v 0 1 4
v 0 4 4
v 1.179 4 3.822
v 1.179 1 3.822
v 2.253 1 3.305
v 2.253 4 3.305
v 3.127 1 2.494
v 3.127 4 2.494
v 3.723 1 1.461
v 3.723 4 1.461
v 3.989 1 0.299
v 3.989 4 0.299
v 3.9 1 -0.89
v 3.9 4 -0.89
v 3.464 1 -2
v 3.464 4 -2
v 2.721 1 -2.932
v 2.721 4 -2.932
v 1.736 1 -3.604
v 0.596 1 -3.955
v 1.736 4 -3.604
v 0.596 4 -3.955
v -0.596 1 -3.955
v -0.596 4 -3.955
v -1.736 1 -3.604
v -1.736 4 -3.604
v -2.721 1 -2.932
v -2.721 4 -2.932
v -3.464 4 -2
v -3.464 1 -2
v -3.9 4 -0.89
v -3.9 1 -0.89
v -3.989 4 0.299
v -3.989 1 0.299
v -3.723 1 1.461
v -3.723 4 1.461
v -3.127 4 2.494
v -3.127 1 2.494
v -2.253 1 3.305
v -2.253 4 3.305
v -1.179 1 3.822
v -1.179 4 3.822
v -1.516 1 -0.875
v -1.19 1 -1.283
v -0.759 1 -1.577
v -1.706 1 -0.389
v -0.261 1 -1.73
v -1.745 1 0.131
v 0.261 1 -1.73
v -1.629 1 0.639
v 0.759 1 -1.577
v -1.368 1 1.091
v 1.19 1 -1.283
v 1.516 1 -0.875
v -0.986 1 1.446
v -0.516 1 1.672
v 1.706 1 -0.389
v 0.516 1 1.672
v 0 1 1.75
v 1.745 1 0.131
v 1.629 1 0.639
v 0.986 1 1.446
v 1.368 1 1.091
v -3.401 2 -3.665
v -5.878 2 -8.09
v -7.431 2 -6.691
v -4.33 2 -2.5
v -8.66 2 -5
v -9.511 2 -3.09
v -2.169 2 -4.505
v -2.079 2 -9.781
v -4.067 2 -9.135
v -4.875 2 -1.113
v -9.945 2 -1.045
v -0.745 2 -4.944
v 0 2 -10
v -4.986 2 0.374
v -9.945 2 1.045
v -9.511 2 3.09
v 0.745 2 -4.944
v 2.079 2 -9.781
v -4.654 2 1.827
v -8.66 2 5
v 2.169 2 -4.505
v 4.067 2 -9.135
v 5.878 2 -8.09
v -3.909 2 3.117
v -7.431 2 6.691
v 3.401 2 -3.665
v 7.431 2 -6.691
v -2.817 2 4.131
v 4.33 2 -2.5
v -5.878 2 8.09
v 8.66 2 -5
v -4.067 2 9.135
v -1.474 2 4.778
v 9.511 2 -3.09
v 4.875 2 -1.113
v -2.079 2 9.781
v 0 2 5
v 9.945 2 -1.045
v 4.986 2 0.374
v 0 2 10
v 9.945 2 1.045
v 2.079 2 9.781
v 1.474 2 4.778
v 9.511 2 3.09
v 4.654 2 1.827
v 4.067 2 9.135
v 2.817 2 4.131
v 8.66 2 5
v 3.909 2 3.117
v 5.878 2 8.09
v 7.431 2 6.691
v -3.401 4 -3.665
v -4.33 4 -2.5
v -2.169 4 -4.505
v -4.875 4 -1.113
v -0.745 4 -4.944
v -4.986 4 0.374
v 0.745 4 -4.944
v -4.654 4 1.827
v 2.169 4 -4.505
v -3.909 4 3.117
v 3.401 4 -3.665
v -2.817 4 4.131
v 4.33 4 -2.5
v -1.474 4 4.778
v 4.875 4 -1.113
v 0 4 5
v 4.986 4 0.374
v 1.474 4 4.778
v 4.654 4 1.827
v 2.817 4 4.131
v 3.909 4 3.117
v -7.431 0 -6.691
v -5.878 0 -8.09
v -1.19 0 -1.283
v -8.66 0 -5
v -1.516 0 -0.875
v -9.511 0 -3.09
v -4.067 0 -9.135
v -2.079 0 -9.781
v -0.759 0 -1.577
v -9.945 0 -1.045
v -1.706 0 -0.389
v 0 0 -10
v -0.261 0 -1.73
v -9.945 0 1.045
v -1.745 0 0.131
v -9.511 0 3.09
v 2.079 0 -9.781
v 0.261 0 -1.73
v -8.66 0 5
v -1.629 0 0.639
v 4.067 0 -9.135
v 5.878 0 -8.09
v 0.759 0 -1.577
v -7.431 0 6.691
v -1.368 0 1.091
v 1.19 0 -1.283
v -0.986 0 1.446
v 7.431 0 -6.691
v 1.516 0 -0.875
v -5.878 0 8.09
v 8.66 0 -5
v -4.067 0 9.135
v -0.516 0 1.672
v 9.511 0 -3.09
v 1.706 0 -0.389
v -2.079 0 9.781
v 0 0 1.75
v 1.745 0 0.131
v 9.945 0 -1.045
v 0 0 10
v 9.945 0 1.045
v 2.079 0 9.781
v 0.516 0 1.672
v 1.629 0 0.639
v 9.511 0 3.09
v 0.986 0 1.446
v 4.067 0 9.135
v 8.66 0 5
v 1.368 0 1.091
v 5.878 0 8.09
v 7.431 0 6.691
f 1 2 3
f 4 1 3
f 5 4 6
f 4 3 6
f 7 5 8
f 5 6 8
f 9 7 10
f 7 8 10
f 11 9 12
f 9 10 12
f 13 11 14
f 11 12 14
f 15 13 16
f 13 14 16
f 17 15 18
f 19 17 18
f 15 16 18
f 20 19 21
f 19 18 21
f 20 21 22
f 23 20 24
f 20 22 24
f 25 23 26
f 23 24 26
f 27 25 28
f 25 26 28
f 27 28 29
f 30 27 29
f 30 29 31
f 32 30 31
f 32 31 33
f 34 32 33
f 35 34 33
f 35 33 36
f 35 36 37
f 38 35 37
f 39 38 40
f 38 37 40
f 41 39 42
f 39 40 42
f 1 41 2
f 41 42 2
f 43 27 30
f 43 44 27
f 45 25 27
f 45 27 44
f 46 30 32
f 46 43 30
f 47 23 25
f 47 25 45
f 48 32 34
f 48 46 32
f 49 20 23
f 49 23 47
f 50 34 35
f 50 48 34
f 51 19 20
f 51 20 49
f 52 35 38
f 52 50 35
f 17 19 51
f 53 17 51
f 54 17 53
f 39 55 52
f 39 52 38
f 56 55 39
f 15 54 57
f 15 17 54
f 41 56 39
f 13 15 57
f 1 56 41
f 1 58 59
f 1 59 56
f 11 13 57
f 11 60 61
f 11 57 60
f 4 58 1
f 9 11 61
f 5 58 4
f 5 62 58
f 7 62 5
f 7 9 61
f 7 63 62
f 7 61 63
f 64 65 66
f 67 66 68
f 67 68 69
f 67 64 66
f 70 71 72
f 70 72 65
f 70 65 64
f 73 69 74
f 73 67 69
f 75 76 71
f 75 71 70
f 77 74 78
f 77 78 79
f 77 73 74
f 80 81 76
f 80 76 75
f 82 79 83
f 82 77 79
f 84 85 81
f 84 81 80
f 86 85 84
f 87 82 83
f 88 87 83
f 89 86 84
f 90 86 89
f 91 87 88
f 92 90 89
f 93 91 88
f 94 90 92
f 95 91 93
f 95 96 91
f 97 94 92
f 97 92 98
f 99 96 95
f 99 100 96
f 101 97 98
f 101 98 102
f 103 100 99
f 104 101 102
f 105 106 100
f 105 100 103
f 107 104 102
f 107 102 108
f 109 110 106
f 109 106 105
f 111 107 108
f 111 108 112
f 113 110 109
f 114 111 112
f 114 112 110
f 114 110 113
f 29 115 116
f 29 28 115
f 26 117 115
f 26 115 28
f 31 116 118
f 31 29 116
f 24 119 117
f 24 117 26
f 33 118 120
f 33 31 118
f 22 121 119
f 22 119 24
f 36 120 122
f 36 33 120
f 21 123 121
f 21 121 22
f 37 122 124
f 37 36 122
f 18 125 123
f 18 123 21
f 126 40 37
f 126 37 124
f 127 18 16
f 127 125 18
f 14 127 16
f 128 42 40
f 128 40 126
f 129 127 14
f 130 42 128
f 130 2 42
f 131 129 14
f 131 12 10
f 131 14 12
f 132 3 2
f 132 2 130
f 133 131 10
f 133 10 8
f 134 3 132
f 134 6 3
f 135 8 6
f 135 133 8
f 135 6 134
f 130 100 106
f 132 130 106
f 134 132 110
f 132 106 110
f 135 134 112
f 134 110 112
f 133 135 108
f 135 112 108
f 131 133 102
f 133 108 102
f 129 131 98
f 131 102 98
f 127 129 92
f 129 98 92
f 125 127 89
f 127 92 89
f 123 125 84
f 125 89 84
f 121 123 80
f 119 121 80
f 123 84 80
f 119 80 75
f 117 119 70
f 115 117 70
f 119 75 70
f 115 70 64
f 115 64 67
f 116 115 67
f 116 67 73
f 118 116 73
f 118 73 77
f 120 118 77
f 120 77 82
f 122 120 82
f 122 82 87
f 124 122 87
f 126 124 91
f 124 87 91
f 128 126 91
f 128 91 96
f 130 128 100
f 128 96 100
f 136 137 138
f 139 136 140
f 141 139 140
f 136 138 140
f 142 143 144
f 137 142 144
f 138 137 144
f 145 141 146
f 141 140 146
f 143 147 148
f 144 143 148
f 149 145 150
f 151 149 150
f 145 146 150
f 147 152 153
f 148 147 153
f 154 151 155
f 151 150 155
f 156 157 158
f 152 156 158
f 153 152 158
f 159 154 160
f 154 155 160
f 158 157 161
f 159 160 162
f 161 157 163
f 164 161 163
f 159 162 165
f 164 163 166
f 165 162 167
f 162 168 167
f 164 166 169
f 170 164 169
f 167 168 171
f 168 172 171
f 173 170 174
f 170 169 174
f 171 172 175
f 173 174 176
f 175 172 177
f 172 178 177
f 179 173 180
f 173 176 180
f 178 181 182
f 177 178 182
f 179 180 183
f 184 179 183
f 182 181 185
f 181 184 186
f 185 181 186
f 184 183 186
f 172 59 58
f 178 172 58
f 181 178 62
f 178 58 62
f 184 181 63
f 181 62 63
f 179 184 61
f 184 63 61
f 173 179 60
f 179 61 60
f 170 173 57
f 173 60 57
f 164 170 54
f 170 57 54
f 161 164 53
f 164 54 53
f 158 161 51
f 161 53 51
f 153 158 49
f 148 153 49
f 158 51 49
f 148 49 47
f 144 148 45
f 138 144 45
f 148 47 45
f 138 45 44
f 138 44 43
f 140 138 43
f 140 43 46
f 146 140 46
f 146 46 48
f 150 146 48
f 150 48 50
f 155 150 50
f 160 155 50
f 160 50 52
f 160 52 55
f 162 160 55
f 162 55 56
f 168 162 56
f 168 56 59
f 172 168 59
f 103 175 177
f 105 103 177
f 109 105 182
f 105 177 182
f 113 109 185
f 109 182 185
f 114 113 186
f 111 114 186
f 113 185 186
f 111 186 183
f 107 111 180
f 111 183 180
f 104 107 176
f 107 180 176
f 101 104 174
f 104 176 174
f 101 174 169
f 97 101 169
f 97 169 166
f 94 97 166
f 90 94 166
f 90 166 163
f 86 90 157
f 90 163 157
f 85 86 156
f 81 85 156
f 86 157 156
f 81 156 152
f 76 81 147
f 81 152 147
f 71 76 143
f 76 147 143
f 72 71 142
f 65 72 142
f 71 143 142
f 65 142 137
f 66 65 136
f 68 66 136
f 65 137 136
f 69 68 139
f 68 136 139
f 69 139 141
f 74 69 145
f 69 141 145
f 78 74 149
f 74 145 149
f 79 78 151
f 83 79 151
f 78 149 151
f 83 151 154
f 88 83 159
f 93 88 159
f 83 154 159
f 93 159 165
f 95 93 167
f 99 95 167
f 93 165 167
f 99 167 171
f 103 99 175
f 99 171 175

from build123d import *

# Parameters (mm, degrees)
SKETCH_1_R          = 10
EXTRUDE_1_DEPTH     = 2
SKETCH_2_R          = 5
EXTRUDE_2_DEPTH     = 2
SKETCH_3_R          = 1.75
CUT_EXTRUDE_1_DEPTH = 15.696938457
SKETCH_4_R          = 4
CUT_EXTRUDE_2_DEPTH = 3


with BuildPart() as part:
    # 草图1 → 凸台-拉伸1 (new body)
    with BuildSketch(Plane(origin=(0, 0, 0), x_dir=(1, 0, 0), z_dir=(0, 1, 0))):
        with Locations(Location((0, 0, 0), (0, 0, 270))):
            Circle(SKETCH_1_R)
    extrude(amount=EXTRUDE_1_DEPTH)

    # 草图2 → 凸台-拉伸2 (add)
    with BuildSketch(Plane(origin=(0, 2, 0), x_dir=(1, 0, 0), z_dir=(0, 1, 0))):
        with Locations(Location((0, 0, 0), (0, 0, 270))):
            Circle(SKETCH_2_R)
    extrude(amount=EXTRUDE_2_DEPTH)

    # 草图3 → 切除-拉伸1 (cut, through all)
    with BuildSketch(Plane(origin=(0, 4, 0), x_dir=(1, 0, 0), z_dir=(0, 1, 0))):
        with Locations(Location((0, 0, 0), (0, 0, 270))):
            Circle(SKETCH_3_R)
    extrude(amount=-CUT_EXTRUDE_1_DEPTH, mode=Mode.SUBTRACT)

    # 草图4 → 切除-拉伸2 (cut)
    with BuildSketch(Plane(origin=(0, 4, 0), x_dir=(1, 0, 0), z_dir=(0, 1, 0))):
        with Locations(Location((0, 0, 0), (0, 0, 270))):
            Circle(SKETCH_4_R)
    extrude(amount=-CUT_EXTRUDE_2_DEPTH, mode=Mode.SUBTRACT)


solid = part.part
